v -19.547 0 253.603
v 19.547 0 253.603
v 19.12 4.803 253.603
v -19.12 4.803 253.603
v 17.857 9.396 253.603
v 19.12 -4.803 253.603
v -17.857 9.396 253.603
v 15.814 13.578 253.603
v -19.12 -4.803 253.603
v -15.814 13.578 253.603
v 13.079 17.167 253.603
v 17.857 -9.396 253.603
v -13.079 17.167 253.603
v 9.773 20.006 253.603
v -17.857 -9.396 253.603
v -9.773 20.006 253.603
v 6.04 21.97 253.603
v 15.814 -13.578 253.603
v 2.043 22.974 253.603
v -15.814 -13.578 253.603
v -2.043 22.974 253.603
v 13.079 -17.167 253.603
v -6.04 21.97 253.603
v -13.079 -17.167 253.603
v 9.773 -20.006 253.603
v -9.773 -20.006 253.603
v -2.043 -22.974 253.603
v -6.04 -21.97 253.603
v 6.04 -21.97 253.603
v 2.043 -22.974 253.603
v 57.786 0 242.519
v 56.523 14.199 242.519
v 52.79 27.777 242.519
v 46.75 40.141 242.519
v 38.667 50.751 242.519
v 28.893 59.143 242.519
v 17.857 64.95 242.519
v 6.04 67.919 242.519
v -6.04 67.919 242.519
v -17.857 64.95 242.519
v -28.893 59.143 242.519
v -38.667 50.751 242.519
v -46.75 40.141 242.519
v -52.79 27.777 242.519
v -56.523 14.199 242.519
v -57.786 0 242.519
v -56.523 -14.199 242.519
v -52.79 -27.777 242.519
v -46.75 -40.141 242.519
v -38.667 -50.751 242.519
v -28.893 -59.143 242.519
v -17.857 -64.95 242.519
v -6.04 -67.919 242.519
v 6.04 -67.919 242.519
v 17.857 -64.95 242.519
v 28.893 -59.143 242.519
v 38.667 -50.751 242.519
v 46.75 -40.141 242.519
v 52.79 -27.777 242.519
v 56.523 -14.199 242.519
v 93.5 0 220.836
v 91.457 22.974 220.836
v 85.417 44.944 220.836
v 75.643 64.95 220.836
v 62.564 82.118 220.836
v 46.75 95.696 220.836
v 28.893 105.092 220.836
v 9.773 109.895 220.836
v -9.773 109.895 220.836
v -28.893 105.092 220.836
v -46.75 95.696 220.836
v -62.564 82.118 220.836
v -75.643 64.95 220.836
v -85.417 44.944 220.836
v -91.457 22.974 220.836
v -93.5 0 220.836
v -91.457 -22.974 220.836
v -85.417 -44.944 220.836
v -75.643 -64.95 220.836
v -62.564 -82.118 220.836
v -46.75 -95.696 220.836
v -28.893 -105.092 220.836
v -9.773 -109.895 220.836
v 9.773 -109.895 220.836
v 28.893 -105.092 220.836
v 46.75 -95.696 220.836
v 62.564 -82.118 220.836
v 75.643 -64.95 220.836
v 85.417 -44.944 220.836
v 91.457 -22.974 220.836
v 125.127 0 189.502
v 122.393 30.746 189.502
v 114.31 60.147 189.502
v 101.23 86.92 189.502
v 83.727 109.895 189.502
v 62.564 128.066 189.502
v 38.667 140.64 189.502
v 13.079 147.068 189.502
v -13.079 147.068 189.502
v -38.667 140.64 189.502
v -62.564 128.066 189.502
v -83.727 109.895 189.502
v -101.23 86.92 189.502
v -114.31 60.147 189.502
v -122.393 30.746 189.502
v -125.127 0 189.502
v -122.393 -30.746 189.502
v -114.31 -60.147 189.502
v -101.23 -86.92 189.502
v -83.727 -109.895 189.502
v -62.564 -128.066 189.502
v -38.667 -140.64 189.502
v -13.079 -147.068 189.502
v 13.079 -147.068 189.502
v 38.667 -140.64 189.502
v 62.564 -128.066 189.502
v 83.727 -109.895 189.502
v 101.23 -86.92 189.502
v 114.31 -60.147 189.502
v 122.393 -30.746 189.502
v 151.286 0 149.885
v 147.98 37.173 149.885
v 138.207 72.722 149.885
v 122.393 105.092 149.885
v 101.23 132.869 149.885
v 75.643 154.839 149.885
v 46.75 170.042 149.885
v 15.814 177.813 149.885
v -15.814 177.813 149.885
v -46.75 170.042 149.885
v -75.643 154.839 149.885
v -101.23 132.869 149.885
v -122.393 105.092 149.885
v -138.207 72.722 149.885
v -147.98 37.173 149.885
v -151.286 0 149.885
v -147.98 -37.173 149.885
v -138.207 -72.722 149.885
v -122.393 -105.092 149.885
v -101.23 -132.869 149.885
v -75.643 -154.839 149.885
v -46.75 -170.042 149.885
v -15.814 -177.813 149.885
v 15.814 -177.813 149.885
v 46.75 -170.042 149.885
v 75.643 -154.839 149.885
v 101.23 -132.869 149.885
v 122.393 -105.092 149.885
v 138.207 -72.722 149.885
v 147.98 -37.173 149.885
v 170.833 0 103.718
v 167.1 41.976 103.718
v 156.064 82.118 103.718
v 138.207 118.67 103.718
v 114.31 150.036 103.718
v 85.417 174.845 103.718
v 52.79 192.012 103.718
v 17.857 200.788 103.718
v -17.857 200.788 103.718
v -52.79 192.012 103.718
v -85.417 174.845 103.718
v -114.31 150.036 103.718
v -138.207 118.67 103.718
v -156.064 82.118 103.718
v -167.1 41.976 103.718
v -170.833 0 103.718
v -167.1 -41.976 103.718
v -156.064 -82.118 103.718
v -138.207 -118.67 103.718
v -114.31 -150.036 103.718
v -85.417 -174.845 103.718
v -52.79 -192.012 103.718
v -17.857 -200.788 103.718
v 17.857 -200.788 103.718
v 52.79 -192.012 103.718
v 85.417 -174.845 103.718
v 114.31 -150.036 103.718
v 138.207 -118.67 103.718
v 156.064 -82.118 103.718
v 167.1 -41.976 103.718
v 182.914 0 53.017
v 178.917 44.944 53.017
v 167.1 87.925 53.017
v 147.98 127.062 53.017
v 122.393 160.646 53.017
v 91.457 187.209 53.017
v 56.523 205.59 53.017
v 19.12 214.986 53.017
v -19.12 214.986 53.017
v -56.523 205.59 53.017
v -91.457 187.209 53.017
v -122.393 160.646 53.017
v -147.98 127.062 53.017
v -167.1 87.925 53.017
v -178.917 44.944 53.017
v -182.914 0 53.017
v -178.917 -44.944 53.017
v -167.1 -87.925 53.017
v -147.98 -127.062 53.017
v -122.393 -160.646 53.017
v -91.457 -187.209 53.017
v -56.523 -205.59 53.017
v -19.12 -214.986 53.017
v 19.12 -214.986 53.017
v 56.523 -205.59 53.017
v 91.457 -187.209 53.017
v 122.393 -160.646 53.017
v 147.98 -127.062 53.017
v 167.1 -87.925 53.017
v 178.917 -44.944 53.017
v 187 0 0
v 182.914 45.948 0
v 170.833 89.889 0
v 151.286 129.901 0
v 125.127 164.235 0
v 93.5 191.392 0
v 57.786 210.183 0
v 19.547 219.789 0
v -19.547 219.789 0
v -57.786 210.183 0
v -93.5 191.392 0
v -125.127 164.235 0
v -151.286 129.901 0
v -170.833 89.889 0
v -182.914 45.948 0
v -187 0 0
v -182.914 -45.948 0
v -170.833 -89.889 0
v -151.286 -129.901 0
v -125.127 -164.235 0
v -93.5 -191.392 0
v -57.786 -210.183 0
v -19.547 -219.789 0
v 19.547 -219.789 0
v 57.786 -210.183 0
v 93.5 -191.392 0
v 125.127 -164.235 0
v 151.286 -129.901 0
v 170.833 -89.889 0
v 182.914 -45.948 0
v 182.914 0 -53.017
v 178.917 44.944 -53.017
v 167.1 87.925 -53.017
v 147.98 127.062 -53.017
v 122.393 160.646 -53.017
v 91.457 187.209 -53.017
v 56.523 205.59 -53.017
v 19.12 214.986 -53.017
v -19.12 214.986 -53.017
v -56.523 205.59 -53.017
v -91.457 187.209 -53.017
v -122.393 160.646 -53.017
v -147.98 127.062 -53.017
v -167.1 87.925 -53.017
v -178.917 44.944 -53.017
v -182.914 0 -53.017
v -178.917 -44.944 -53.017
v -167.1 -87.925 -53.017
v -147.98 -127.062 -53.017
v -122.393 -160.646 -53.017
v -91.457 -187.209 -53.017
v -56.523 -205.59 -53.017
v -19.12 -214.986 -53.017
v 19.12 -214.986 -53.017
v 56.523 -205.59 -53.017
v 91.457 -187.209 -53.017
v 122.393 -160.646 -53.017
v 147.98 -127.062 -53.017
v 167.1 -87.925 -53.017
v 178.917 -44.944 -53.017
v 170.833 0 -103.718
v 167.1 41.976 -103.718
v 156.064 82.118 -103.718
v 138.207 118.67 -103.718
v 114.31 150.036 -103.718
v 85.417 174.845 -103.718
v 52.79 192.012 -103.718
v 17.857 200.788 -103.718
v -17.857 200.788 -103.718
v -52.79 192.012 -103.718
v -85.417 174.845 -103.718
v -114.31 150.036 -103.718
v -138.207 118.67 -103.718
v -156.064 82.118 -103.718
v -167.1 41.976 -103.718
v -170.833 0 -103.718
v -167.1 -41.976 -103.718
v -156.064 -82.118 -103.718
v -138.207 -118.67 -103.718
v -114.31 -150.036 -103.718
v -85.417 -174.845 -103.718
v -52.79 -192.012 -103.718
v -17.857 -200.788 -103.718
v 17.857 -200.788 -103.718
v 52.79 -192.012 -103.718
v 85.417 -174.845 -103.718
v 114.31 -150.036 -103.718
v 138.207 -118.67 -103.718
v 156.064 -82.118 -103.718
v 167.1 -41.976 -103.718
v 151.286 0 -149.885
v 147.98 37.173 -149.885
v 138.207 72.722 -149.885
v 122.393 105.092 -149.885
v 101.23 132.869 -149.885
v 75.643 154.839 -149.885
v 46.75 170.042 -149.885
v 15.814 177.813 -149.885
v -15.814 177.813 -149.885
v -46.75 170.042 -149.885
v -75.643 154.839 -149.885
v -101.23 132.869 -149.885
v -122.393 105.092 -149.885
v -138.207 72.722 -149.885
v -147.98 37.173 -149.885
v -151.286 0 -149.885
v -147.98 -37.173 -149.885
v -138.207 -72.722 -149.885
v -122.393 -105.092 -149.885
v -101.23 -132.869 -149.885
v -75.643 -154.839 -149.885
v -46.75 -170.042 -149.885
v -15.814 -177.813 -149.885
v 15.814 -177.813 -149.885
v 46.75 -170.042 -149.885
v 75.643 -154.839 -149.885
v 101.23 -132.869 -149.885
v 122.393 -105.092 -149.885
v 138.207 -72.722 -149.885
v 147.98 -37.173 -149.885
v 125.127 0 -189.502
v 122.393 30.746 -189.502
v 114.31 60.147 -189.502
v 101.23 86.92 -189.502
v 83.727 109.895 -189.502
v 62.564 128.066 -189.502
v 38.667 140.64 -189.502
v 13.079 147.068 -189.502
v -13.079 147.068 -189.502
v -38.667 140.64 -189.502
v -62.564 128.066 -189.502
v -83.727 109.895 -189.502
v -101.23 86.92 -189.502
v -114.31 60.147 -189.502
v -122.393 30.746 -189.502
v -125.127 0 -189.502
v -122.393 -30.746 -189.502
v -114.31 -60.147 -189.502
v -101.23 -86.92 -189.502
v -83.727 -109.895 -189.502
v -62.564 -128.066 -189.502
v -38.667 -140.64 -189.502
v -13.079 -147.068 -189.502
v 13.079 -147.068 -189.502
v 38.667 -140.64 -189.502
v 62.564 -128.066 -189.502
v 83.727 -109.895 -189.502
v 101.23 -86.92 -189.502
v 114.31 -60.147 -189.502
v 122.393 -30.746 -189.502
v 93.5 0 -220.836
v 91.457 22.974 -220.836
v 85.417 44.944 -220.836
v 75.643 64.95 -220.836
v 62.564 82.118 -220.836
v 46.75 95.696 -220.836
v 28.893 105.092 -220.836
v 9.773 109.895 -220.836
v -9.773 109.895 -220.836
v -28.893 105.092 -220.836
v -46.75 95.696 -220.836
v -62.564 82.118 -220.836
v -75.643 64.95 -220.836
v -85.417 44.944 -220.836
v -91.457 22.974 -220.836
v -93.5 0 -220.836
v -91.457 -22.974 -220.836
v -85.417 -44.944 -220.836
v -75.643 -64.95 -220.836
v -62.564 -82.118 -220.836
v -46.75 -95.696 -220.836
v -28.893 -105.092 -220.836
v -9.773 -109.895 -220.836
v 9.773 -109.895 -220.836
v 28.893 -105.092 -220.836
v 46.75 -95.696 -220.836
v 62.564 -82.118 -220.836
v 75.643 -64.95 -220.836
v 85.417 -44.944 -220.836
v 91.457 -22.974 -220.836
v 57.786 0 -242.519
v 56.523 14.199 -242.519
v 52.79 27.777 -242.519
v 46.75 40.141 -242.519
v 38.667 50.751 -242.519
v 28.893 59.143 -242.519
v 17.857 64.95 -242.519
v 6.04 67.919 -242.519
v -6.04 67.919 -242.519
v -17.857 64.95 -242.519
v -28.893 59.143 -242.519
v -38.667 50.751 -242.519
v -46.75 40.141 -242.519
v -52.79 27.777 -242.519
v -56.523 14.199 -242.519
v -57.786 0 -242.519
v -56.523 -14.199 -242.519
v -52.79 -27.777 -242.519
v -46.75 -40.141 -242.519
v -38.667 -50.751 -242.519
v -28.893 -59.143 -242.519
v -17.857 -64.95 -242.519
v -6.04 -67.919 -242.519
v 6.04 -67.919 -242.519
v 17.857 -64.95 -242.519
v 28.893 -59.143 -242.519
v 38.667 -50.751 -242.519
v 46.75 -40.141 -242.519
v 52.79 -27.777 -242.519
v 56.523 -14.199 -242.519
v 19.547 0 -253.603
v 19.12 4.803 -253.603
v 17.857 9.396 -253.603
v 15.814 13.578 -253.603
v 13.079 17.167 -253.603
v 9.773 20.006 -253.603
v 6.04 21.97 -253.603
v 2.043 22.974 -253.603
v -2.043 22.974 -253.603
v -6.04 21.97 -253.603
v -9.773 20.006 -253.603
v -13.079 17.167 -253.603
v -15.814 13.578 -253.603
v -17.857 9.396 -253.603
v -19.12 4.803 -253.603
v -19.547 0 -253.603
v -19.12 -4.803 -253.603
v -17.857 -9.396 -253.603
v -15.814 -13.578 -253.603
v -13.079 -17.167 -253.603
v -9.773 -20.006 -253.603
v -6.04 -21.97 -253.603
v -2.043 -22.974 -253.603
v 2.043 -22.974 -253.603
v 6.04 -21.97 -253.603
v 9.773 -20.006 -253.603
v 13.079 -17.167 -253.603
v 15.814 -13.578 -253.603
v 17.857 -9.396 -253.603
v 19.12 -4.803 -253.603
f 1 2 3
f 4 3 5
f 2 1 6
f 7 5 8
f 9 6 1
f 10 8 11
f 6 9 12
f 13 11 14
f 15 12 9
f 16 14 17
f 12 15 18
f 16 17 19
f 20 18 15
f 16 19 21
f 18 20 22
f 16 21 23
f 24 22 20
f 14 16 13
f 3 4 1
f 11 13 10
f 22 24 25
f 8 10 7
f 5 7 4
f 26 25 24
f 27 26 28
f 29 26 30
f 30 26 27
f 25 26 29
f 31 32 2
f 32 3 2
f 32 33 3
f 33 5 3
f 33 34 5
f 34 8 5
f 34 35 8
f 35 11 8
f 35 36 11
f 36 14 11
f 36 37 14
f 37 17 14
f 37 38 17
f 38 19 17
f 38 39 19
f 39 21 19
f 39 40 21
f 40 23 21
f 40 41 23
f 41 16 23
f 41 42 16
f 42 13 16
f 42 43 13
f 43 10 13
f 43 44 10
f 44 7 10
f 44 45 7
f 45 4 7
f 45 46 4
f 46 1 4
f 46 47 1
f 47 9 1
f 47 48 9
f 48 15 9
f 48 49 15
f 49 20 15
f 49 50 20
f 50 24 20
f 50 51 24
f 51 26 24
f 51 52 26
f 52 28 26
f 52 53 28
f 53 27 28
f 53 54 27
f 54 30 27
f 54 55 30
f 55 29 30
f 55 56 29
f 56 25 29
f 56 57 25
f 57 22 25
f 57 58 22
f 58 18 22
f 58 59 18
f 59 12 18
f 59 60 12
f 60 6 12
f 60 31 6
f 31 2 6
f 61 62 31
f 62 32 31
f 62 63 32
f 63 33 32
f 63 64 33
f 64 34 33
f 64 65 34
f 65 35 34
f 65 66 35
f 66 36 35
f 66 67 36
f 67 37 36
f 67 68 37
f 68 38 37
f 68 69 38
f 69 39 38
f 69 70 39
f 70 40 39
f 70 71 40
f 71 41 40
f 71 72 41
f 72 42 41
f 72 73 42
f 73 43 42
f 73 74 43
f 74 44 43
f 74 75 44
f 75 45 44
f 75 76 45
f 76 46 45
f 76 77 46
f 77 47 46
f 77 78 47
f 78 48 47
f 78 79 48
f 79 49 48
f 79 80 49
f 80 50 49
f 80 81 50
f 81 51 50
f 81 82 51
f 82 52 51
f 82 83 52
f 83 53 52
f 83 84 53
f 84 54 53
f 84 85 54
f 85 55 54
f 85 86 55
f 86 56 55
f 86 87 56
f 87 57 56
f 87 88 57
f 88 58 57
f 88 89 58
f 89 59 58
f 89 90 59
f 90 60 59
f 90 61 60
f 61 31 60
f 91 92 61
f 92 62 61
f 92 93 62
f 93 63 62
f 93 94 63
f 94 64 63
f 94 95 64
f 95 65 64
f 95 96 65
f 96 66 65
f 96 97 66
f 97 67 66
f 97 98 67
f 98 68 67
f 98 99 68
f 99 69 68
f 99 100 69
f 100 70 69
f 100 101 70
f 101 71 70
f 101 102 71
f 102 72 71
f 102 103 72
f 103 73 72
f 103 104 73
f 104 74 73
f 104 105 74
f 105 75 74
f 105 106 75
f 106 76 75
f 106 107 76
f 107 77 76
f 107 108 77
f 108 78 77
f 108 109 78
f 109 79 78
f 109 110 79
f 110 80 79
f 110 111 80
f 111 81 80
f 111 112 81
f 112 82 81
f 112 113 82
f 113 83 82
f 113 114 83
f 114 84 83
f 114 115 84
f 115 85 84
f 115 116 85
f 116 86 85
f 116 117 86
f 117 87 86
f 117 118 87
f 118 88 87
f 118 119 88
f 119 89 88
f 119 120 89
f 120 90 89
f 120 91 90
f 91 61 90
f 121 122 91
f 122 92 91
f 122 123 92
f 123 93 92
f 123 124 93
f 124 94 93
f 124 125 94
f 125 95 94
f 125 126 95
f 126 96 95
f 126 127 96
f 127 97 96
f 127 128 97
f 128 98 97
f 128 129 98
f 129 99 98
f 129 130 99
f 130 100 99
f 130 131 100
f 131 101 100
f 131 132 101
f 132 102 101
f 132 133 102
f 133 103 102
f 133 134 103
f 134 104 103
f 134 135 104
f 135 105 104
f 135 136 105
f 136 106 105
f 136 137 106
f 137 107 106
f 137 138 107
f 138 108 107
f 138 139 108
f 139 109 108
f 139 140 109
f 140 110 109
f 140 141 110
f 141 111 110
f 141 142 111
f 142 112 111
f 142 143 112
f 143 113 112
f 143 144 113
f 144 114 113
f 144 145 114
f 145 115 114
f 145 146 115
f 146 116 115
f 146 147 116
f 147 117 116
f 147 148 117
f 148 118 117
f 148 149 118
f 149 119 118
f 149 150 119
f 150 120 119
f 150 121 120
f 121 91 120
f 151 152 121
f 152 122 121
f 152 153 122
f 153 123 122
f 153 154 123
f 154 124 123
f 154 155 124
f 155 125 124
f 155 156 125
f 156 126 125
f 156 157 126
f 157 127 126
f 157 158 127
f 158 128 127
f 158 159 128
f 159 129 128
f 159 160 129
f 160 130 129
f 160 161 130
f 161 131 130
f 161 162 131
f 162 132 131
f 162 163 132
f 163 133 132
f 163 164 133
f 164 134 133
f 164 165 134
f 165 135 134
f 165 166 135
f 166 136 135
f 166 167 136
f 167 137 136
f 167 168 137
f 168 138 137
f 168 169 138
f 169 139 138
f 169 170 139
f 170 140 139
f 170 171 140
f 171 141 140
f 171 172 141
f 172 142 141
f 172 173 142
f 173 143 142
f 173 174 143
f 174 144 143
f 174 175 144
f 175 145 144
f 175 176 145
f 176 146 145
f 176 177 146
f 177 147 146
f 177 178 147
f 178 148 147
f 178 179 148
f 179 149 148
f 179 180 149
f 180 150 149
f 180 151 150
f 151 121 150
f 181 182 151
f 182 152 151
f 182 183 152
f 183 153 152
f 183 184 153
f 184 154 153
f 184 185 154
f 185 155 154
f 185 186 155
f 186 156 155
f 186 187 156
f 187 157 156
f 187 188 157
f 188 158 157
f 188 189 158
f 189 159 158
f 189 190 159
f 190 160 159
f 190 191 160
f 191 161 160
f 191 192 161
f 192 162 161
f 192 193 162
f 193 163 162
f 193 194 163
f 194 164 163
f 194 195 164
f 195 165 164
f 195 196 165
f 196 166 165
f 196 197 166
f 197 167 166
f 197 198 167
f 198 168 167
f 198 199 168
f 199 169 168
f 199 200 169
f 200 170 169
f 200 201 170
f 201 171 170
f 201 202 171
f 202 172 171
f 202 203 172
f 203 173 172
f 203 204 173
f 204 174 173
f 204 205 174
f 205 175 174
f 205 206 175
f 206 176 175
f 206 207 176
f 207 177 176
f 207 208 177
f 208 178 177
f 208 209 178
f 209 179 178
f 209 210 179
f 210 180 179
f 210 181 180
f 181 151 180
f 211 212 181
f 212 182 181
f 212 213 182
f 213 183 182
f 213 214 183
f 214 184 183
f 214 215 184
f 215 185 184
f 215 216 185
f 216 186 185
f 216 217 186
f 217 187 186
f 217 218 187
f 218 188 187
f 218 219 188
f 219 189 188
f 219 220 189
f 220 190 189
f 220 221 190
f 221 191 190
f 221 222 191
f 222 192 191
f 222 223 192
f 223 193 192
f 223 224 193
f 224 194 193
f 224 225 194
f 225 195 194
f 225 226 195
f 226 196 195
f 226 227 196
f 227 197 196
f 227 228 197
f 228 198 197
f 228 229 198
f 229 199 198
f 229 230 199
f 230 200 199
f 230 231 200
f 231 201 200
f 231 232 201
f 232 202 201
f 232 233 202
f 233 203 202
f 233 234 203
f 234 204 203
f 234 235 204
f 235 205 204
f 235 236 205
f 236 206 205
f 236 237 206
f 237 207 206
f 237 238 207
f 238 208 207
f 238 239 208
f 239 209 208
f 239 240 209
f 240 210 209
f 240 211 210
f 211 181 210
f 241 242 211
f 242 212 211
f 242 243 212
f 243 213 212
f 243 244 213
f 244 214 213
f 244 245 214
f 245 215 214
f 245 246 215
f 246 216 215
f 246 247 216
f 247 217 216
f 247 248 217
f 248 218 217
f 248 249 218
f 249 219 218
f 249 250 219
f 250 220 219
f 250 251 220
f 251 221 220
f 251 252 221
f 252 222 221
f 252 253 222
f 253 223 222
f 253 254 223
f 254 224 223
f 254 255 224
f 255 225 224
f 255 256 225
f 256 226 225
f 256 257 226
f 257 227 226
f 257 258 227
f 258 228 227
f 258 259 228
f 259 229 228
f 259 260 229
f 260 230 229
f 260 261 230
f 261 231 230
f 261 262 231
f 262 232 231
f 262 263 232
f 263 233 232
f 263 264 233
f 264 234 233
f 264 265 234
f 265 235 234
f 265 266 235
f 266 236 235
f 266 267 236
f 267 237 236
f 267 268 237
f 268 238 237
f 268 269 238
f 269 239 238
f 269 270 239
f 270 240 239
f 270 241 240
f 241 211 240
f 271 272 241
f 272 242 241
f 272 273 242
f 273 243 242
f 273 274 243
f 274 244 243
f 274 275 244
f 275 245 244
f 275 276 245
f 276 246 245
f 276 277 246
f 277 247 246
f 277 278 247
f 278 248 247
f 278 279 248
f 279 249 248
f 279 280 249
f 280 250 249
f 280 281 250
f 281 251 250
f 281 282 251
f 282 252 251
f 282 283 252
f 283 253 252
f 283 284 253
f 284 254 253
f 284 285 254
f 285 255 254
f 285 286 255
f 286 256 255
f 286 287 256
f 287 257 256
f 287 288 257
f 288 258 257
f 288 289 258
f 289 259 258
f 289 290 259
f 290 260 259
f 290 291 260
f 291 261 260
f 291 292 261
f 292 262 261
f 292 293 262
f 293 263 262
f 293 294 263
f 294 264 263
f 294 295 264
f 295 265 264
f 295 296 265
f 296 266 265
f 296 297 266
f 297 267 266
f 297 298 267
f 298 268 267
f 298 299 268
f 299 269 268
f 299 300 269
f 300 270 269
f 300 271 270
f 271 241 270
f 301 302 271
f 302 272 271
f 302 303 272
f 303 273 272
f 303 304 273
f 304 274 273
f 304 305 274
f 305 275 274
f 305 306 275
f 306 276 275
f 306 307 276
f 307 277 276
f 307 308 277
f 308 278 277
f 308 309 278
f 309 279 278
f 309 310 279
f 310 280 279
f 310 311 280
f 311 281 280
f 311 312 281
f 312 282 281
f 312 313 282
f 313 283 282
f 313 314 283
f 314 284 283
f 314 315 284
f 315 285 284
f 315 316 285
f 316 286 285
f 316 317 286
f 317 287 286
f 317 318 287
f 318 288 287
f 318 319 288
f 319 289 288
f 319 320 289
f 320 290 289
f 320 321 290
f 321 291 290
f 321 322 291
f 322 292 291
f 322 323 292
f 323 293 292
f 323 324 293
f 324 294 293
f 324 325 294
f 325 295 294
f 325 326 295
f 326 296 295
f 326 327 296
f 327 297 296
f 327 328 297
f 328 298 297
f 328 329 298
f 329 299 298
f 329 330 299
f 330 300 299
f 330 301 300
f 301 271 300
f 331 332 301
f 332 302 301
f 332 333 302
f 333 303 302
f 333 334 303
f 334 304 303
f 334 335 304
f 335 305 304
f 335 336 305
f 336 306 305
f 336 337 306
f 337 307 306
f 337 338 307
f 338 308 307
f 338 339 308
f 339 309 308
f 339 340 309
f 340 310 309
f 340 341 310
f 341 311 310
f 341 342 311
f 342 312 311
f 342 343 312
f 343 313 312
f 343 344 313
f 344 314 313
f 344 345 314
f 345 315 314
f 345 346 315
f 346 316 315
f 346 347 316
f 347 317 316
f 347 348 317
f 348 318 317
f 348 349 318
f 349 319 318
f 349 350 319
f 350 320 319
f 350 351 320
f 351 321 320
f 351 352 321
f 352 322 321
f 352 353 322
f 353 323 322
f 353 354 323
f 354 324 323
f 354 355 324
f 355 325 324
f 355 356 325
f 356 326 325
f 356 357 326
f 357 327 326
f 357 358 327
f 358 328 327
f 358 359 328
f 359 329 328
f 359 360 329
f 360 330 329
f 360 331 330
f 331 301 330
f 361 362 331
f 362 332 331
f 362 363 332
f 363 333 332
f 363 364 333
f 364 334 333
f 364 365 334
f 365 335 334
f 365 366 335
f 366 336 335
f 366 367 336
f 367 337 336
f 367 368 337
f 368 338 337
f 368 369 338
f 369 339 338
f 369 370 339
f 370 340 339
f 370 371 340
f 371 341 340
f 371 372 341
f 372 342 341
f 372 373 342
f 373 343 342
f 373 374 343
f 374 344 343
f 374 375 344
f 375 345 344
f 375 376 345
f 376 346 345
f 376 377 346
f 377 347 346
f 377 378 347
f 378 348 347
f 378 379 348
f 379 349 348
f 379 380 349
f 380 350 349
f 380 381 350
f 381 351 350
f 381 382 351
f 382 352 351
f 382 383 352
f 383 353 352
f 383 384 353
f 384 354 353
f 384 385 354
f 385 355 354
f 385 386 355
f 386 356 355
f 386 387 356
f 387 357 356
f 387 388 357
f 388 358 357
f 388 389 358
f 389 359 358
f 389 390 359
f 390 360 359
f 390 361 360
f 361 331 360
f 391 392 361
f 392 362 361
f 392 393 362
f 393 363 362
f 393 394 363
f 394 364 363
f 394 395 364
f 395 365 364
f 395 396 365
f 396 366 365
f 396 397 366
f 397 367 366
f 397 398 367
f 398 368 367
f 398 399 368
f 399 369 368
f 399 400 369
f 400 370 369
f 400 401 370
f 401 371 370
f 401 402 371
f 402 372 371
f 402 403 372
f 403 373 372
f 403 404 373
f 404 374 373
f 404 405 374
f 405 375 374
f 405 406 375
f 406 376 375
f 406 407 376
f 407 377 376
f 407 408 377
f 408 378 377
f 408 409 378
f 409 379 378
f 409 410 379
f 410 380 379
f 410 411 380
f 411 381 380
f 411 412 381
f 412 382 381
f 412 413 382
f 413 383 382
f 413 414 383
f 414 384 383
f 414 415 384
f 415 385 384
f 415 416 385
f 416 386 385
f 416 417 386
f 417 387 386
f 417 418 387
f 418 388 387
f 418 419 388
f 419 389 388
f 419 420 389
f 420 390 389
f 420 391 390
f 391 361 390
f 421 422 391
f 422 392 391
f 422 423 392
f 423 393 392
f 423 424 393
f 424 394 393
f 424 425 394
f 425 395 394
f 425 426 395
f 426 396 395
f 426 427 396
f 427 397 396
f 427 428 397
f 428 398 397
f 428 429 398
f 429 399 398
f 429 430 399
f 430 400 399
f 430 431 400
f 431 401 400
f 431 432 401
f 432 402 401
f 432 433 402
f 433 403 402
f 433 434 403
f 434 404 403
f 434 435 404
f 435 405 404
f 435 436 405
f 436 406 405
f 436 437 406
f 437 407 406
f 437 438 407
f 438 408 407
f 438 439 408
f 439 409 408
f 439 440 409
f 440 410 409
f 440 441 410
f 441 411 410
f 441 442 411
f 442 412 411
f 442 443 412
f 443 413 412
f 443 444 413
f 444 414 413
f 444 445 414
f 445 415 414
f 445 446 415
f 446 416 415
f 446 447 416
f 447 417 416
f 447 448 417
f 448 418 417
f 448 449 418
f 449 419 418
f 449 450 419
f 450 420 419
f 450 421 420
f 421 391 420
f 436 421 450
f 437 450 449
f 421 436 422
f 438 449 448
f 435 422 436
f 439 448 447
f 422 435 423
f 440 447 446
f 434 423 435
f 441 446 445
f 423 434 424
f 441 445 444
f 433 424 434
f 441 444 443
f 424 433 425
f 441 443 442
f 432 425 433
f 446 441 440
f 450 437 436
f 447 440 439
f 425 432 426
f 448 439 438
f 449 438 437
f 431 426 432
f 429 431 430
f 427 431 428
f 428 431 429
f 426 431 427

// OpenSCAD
// Generated by SolidPython 1.0.1 on 2020-07-29 00:39:26


scale(v = [11, 13, 15]) {
	sphere(r = 17);
}
/***********************************************
*********      SolidPython code:      **********
************************************************
 
# import packages: SolidPython
from solid import *
from solid.utils import *
from itertools import chain, combinations


class Resize:

    def __init__(self, scad_file):
        self.scad_file = scad_file
        #self.scad_file = import_scad(scad_file)
        # cone/cylinder param:
        self.r1 = 0
        self.r2 = 0
        self.h = 0
        # rectangular prism param:
        self.w = 0
        self.l = 0
        # ellipse param:
        self.r = 0

    # import OpenScad code (file name corresponds to shape)


    # classify shape + parameters
    def assign(self, param1, param2, param3):
        if self.scad_file == 'cone.scad':
            self.r1 = param1
            self.r2 = param2
            self.h = param3
        elif self.scad_file == 'cylinder.scad':
            self.r1 = param1
            self.r2 = param2
            self.h = param3
        elif self.scad_file == 'rectangularPrism.scad':
            self.h = param1
            self.l = param2
            self.w = param3
        else:
            self.r = param1
            self.h = param2

    # resize parameters
    def iterate(self):
        x = range(3, 20, 2)
        i = 1
        if self.scad_file == 'cone.scad':
            tempList = list(combinations(x, 2))
            for temp in tempList:
                param1 = temp[0]
                param2 = temp[1]
                filepath = 'produced_scad_files/' + 'cone' + str(param1) + '_' + str(param2) + '_' + '.scad'
                scad_render_to_file(cylinder(h=param1, r1=param2, r2=0), filepath)

        elif self.scad_file == 'cylinder.scad':
            tempList = list(combinations(x, 3))
            for temp in tempList:
                param1 = temp[0]
                param2 = temp[1]
                filepath = 'produced_scad_files/' + 'cylinder' + str(param1) + '_' + str(param2) + '_' + '.scad'
                scad_render_to_file(cylinder(h=param1, r1=param2, r2=param2), filepath)

        elif self.scad_file == 'rectangularPrism.scad':
            tempList = list(combinations(x, 3))
            for temp in tempList:
                param1 = temp[0]
                param2 = temp[1]
                param3 = temp[2]
                filepath = 'produced_scad_files/' + 'rectangularPrism' + str(param1) + '_' + str(param2) + '_' + str(
                    param3) + '.scad'
                scad_render_to_file(cube(size=(param1, param2, param3)), filepath)

        elif self.scad_file == 'ellipse.scad':
            tempList = list(combinations(x, 4))
            for temp in tempList:
                param1 = temp[0]
                param2 = temp[1]
                param3 = temp[2]
                param4 = temp[3]
                filepath = 'produced_scad_files/' + 'ellipse' + str(param1) + '_' + str(param2) + '_' + str(param3) + '_' + str(param4) + '.scad'
                scad_render_to_file(scale([param1, param2, param3])(sphere(r=param4)), filepath)

    def render_to_scadfile(self):
        scad_render_to_file(scad, 'example.scad') 
 
************************************************/
